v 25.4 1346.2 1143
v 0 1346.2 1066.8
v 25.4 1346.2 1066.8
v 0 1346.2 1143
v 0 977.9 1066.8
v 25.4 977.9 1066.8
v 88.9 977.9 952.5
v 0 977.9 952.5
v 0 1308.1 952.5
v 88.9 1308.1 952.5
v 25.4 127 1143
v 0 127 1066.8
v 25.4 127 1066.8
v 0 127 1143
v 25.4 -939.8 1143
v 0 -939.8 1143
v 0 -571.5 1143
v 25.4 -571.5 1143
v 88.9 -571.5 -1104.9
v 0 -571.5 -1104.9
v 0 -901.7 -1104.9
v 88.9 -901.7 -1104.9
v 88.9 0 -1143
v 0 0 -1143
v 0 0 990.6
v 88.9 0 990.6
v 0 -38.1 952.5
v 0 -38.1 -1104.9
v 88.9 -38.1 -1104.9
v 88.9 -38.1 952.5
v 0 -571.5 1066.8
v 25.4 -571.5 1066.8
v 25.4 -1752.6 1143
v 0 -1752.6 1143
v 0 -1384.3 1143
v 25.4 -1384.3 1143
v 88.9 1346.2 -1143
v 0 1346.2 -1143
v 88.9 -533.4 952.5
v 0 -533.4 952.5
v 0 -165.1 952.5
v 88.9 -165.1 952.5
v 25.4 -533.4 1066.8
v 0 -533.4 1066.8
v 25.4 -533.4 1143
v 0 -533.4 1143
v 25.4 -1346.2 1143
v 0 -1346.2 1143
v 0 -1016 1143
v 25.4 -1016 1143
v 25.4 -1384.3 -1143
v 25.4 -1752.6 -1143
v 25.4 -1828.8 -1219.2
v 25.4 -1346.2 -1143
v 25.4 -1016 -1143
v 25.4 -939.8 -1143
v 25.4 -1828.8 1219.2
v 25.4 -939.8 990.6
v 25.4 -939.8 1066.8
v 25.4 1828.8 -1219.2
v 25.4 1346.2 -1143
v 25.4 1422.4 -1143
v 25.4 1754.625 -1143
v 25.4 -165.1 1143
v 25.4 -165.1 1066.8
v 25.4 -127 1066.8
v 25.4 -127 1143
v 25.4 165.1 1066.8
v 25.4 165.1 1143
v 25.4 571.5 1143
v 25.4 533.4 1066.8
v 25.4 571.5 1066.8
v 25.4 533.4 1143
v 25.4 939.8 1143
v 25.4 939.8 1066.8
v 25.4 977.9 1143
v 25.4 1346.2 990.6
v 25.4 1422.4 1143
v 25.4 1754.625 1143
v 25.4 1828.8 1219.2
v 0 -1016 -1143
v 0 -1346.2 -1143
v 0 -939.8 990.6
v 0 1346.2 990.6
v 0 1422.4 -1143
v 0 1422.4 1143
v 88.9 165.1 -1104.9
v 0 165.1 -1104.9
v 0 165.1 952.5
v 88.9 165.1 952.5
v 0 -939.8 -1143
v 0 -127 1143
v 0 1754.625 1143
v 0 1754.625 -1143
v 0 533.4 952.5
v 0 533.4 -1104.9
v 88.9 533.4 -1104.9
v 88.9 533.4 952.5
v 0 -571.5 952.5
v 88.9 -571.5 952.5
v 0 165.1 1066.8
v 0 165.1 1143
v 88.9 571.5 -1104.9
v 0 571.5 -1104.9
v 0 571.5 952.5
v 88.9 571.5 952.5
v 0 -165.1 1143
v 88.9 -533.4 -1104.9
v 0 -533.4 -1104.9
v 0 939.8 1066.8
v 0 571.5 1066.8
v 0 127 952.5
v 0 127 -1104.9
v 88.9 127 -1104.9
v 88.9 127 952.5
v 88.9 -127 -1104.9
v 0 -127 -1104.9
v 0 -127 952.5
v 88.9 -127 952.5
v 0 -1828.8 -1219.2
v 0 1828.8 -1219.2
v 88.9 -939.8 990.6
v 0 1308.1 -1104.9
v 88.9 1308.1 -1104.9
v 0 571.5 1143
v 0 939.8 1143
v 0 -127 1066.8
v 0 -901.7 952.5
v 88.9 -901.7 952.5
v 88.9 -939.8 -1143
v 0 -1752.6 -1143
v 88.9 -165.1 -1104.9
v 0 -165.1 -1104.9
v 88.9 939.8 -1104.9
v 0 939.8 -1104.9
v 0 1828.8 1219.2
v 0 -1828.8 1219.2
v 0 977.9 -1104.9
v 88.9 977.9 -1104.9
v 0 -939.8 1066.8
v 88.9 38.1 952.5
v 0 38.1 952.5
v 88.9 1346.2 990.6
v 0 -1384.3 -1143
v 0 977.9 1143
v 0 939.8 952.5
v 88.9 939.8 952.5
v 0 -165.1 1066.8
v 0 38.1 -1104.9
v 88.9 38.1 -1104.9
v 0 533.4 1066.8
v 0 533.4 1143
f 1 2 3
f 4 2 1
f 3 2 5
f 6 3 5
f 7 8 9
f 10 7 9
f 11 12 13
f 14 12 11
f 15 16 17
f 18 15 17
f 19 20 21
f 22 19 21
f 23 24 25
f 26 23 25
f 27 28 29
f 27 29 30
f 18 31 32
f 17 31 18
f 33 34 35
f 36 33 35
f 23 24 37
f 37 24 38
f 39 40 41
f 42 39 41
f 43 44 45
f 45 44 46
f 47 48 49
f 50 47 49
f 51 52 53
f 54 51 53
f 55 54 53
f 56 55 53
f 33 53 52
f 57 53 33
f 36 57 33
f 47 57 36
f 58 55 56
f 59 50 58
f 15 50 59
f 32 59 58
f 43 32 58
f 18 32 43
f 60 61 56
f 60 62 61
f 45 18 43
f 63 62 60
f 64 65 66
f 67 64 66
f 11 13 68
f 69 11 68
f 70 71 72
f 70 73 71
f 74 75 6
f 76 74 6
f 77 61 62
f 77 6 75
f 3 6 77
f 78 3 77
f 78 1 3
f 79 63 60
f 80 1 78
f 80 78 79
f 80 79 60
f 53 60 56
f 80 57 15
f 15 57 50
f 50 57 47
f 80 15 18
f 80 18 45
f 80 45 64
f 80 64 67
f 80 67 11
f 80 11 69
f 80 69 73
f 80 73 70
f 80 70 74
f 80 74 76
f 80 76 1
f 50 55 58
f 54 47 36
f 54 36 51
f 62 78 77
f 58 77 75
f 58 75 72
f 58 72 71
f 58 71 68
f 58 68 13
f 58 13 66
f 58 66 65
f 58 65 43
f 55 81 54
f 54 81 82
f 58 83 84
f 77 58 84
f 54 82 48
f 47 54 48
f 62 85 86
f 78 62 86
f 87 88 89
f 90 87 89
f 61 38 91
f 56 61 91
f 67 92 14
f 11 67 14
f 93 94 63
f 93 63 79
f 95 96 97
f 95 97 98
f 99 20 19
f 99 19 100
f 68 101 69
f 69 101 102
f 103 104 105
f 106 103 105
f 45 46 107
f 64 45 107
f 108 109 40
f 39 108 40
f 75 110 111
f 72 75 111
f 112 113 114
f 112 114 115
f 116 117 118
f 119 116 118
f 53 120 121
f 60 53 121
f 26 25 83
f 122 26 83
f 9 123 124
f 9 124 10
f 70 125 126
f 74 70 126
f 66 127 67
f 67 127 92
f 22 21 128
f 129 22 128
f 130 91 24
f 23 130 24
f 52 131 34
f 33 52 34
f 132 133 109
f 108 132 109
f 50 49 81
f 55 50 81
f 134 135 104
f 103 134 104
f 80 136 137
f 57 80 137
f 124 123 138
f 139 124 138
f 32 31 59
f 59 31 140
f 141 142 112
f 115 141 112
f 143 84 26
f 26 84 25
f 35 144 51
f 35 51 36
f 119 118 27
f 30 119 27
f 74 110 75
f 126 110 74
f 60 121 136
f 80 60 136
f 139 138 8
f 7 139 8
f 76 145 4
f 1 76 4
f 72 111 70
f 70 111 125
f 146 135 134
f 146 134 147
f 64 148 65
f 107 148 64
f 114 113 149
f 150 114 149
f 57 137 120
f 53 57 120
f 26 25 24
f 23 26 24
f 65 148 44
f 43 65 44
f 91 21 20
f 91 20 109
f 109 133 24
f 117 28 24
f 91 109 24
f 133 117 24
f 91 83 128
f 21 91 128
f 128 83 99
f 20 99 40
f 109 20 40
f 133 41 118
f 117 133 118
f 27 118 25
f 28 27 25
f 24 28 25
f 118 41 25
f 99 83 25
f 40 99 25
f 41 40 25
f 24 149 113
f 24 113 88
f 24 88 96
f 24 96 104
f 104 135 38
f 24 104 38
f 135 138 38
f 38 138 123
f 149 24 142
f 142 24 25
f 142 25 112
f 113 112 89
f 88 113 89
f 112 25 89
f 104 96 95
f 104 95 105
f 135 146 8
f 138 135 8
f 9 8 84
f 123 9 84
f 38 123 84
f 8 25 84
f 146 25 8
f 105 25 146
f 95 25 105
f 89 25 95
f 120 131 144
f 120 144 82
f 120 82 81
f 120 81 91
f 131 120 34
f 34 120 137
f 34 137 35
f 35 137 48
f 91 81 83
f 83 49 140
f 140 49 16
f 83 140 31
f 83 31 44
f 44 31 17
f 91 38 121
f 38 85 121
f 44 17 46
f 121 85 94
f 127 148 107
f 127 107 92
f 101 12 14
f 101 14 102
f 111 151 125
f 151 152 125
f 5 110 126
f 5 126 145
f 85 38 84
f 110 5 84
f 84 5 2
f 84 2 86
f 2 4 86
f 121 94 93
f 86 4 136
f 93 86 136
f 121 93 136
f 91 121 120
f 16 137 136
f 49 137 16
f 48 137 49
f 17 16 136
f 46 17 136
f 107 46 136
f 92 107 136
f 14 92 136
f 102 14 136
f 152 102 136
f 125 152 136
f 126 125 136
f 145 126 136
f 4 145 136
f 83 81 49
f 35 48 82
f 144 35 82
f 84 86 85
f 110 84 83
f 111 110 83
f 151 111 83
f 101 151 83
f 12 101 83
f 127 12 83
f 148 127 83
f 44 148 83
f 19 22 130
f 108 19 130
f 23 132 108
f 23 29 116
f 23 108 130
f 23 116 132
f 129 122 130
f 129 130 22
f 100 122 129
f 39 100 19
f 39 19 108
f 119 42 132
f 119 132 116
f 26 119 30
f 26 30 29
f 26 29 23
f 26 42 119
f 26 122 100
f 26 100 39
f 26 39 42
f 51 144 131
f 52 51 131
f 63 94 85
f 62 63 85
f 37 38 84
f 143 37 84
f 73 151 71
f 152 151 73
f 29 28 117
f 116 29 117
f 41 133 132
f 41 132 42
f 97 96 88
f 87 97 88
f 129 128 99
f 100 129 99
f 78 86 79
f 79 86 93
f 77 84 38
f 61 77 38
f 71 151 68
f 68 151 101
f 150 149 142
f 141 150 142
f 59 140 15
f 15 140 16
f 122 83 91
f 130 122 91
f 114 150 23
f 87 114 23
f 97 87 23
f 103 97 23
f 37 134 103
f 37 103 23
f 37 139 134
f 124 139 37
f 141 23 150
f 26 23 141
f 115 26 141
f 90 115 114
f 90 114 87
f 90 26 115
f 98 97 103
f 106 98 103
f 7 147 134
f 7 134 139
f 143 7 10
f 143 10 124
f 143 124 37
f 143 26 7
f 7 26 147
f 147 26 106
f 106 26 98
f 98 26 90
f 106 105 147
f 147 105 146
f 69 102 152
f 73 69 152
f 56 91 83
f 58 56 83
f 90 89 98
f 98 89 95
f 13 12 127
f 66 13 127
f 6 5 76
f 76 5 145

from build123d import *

# Parameters (mm, degrees)
F0_W     = 38.1
F0_H     = 2057.4
F1_DEPTH = 88.9
F2_DEPTH = 88.9
F0_W_2   = 36.075156
F0_H_2   = 2286
F0_H_3   = 2133.6
F0_H_4   = 76.2
F3_DEPTH = 25.4


with BuildPart() as f1:
    # F0 (on Right) → F1 (new body)
    with BuildSketch(Plane.YZ):
        Polygon((1346.2, 952.5), (1346.2, 990.6), (0, 990.6), (0, 952.5), (38.1, 952.5), (127, 952.5), (165.1, 952.5), (533.4, 952.5), (571.5, 952.5), (939.8, 952.5), (977.9, 952.5), (1308.1, 952.5), align=None)
        with Locations((19.05, -76.2)):
            Rectangle(F0_W, F0_H)
        with Locations((146.05, -76.2)):
            Rectangle(F0_W, F0_H)
        Polygon((977.9, -1143), (1346.2, -1143), (1346.2, -1104.9), (1308.1, -1104.9), (977.9, -1104.9), (939.8, -1104.9), (571.5, -1104.9), (533.4, -1104.9), (165.1, -1104.9), (127, -1104.9), (38.1, -1104.9), (0, -1104.9), (0, -1143), (38.1, -1143), (127, -1143), (165.1, -1143), (533.4, -1143), (571.5, -1143), (939.8, -1143), align=None)
        with Locations((552.45, -76.2)):
            Rectangle(F0_W, F0_H)
        with Locations((958.85, -76.2)):
            Rectangle(F0_W, F0_H)
        with Locations((1327.15, -76.2)):
            Rectangle(F0_W, F0_H)
    extrude(amount=F1_DEPTH)


with BuildPart() as f2:
    # F0 (on Right) → F2 (new body)
    with BuildSketch(Plane.YZ):
        Polygon((0, 990.6), (-939.8, 990.6), (-939.8, 952.5), (-901.7, 952.5), (-571.5, 952.5), (-533.4, 952.5), (-165.1, 952.5), (-127, 952.5), (-38.1, 952.5), (0, 952.5), align=None)
        with Locations((-19.05, -76.2)):
            Rectangle(F0_W, F0_H)
        with Locations((-146.05, -76.2)):
            Rectangle(F0_W, F0_H)
        with Locations((-552.45, -76.2)):
            Rectangle(F0_W, F0_H)
        with Locations((-920.75, -76.2)):
            Rectangle(F0_W, F0_H)
        Polygon((-939.8, -1104.9), (-939.8, -1143), (-571.5, -1143), (-533.4, -1143), (-165.1, -1143), (-127, -1143), (-38.1, -1143), (0, -1143), (0, -1104.9), (-38.1, -1104.9), (-127, -1104.9), (-165.1, -1104.9), (-533.4, -1104.9), (-571.5, -1104.9), (-901.7, -1104.9), align=None)
    extrude(amount=F2_DEPTH)


with BuildPart() as f3:
    # F0 (on Right) → F3 (new body)
    with BuildSketch(Plane.YZ):
        Polygon((-1828.8, 1219.2), (-1828.8, 1181.1), (0, 1181.1), (1828.8, 1181.1), (1828.8, 1219.2), align=None)
        Polygon((-1828.8, 1181.1), (-1828.8, 1143), (-1790.7, 1143), (-1752.6, 1143), (-1384.3, 1143), (-1346.2, 1143), (-1016, 1143), (-977.9, 1143), (-939.8, 1143), (-571.5, 1143), (-533.4, 1143), (-165.1, 1143), (-127, 1143), (-38.1, 1143), (0, 1143), (38.1, 1143), (127, 1143), (165.1, 1143), (533.4, 1143), (571.5, 1143), (939.8, 1143), (977.9, 1143), (1346.2, 1143), (1384.3, 1143), (1422.4, 1143), (1754.624844, 1143), (1792.724844, 1143), (1828.8, 1143), (1828.8, 1181.1), (0, 1181.1), align=None)
        Polygon((1422.4, 1028.7), (1422.4, 1066.8), (1384.3, 1066.8), (1346.2, 1066.8), (977.9, 1066.8), (939.8, 1066.8), (571.5, 1066.8), (533.4, 1066.8), (165.1, 1066.8), (127, 1066.8), (-127, 1066.8), (-165.1, 1066.8), (-533.4, 1066.8), (-571.5, 1066.8), (-939.8, 1066.8), (-977.9, 1066.8), (-1016, 1066.8), (-1016, 1028.7), (-939.8, 1028.7), (1346.2, 1028.7), align=None)
        Polygon((1384.3, 990.6), (1422.4, 990.6), (1422.4, 1028.7), (1346.2, 1028.7), (-939.8, 1028.7), (-1016, 1028.7), (-1016, 990.6), (-977.9, 990.6), (-939.8, 990.6), (0, 990.6), (1346.2, 990.6), align=None)
        Polygon((-1828.8, -1143), (-1828.8, -1181.1), (0, -1181.1), (1828.8, -1181.1), (1828.8, -1143), (1792.724844, -1143), (1754.624844, -1143), (1422.4, -1143), (1384.3, -1143), (1346.2, -1143), (977.9, -1143), (939.8, -1143), (571.5, -1143), (533.4, -1143), (165.1, -1143), (127, -1143), (38.1, -1143), (0, -1143), (-38.1, -1143), (-127, -1143), (-165.1, -1143), (-533.4, -1143), (-571.5, -1143), (-939.8, -1143), (-977.9, -1143), (-1016, -1143), (-1346.2, -1143), (-1384.3, -1143), (-1752.6, -1143), (-1790.7, -1143), align=None)
        Polygon((-1828.8, -1181.1), (-1828.8, -1219.2), (0, -1219.2), (1828.8, -1219.2), (1828.8, -1181.1), (0, -1181.1), align=None)
        with Locations((1810.762422, 0)):
            Rectangle(F0_W_2, F0_H_2)
        with Locations((1773.674844, 0)):
            Rectangle(F0_W, F0_H_2)
        with Locations((1403.35, -76.2)):
            Rectangle(F0_W, F0_H_3)
        Polygon((1346.2, -1143), (1384.3, -1143), (1384.3, 990.6), (1346.2, 990.6), (1346.2, 952.5), (1346.2, -1104.9), align=None)
        Polygon((-977.9, 990.6), (-977.9, -1143), (-939.8, -1143), (-939.8, -1104.9), (-939.8, 952.5), (-939.8, 990.6), align=None)
        with Locations((-996.95, -76.2)):
            Rectangle(F0_W, F0_H_3)
        with Locations((-1365.25, 0)):
            Rectangle(F0_W, F0_H_2)
        with Locations((-1771.65, 0)):
            Rectangle(F0_W, F0_H_2)
        with Locations((-1809.75, 0)):
            Rectangle(F0_W, F0_H_2)
        with Locations((-996.95, 1104.9)):
            Rectangle(F0_W, F0_H_4)
        with Locations((-958.85, 1104.9)):
            Rectangle(F0_W, F0_H_4)
        with Locations((-552.45, 1104.9)):
            Rectangle(F0_W, F0_H_4)
        with Locations((-146.05, 1104.9)):
            Rectangle(F0_W, F0_H_4)
        with Locations((146.05, 1104.9)):
            Rectangle(F0_W, F0_H_4)
        with Locations((552.45, 1104.9)):
            Rectangle(F0_W, F0_H_4)
        with Locations((958.85, 1104.9)):
            Rectangle(F0_W, F0_H_4)
        with Locations((1365.25, 1104.9)):
            Rectangle(F0_W, F0_H_4)
        with Locations((1403.35, 1104.9)):
            Rectangle(F0_W, F0_H_4)
    extrude(amount=F3_DEPTH)


solid = Compound([f1.part, f2.part, f3.part])
